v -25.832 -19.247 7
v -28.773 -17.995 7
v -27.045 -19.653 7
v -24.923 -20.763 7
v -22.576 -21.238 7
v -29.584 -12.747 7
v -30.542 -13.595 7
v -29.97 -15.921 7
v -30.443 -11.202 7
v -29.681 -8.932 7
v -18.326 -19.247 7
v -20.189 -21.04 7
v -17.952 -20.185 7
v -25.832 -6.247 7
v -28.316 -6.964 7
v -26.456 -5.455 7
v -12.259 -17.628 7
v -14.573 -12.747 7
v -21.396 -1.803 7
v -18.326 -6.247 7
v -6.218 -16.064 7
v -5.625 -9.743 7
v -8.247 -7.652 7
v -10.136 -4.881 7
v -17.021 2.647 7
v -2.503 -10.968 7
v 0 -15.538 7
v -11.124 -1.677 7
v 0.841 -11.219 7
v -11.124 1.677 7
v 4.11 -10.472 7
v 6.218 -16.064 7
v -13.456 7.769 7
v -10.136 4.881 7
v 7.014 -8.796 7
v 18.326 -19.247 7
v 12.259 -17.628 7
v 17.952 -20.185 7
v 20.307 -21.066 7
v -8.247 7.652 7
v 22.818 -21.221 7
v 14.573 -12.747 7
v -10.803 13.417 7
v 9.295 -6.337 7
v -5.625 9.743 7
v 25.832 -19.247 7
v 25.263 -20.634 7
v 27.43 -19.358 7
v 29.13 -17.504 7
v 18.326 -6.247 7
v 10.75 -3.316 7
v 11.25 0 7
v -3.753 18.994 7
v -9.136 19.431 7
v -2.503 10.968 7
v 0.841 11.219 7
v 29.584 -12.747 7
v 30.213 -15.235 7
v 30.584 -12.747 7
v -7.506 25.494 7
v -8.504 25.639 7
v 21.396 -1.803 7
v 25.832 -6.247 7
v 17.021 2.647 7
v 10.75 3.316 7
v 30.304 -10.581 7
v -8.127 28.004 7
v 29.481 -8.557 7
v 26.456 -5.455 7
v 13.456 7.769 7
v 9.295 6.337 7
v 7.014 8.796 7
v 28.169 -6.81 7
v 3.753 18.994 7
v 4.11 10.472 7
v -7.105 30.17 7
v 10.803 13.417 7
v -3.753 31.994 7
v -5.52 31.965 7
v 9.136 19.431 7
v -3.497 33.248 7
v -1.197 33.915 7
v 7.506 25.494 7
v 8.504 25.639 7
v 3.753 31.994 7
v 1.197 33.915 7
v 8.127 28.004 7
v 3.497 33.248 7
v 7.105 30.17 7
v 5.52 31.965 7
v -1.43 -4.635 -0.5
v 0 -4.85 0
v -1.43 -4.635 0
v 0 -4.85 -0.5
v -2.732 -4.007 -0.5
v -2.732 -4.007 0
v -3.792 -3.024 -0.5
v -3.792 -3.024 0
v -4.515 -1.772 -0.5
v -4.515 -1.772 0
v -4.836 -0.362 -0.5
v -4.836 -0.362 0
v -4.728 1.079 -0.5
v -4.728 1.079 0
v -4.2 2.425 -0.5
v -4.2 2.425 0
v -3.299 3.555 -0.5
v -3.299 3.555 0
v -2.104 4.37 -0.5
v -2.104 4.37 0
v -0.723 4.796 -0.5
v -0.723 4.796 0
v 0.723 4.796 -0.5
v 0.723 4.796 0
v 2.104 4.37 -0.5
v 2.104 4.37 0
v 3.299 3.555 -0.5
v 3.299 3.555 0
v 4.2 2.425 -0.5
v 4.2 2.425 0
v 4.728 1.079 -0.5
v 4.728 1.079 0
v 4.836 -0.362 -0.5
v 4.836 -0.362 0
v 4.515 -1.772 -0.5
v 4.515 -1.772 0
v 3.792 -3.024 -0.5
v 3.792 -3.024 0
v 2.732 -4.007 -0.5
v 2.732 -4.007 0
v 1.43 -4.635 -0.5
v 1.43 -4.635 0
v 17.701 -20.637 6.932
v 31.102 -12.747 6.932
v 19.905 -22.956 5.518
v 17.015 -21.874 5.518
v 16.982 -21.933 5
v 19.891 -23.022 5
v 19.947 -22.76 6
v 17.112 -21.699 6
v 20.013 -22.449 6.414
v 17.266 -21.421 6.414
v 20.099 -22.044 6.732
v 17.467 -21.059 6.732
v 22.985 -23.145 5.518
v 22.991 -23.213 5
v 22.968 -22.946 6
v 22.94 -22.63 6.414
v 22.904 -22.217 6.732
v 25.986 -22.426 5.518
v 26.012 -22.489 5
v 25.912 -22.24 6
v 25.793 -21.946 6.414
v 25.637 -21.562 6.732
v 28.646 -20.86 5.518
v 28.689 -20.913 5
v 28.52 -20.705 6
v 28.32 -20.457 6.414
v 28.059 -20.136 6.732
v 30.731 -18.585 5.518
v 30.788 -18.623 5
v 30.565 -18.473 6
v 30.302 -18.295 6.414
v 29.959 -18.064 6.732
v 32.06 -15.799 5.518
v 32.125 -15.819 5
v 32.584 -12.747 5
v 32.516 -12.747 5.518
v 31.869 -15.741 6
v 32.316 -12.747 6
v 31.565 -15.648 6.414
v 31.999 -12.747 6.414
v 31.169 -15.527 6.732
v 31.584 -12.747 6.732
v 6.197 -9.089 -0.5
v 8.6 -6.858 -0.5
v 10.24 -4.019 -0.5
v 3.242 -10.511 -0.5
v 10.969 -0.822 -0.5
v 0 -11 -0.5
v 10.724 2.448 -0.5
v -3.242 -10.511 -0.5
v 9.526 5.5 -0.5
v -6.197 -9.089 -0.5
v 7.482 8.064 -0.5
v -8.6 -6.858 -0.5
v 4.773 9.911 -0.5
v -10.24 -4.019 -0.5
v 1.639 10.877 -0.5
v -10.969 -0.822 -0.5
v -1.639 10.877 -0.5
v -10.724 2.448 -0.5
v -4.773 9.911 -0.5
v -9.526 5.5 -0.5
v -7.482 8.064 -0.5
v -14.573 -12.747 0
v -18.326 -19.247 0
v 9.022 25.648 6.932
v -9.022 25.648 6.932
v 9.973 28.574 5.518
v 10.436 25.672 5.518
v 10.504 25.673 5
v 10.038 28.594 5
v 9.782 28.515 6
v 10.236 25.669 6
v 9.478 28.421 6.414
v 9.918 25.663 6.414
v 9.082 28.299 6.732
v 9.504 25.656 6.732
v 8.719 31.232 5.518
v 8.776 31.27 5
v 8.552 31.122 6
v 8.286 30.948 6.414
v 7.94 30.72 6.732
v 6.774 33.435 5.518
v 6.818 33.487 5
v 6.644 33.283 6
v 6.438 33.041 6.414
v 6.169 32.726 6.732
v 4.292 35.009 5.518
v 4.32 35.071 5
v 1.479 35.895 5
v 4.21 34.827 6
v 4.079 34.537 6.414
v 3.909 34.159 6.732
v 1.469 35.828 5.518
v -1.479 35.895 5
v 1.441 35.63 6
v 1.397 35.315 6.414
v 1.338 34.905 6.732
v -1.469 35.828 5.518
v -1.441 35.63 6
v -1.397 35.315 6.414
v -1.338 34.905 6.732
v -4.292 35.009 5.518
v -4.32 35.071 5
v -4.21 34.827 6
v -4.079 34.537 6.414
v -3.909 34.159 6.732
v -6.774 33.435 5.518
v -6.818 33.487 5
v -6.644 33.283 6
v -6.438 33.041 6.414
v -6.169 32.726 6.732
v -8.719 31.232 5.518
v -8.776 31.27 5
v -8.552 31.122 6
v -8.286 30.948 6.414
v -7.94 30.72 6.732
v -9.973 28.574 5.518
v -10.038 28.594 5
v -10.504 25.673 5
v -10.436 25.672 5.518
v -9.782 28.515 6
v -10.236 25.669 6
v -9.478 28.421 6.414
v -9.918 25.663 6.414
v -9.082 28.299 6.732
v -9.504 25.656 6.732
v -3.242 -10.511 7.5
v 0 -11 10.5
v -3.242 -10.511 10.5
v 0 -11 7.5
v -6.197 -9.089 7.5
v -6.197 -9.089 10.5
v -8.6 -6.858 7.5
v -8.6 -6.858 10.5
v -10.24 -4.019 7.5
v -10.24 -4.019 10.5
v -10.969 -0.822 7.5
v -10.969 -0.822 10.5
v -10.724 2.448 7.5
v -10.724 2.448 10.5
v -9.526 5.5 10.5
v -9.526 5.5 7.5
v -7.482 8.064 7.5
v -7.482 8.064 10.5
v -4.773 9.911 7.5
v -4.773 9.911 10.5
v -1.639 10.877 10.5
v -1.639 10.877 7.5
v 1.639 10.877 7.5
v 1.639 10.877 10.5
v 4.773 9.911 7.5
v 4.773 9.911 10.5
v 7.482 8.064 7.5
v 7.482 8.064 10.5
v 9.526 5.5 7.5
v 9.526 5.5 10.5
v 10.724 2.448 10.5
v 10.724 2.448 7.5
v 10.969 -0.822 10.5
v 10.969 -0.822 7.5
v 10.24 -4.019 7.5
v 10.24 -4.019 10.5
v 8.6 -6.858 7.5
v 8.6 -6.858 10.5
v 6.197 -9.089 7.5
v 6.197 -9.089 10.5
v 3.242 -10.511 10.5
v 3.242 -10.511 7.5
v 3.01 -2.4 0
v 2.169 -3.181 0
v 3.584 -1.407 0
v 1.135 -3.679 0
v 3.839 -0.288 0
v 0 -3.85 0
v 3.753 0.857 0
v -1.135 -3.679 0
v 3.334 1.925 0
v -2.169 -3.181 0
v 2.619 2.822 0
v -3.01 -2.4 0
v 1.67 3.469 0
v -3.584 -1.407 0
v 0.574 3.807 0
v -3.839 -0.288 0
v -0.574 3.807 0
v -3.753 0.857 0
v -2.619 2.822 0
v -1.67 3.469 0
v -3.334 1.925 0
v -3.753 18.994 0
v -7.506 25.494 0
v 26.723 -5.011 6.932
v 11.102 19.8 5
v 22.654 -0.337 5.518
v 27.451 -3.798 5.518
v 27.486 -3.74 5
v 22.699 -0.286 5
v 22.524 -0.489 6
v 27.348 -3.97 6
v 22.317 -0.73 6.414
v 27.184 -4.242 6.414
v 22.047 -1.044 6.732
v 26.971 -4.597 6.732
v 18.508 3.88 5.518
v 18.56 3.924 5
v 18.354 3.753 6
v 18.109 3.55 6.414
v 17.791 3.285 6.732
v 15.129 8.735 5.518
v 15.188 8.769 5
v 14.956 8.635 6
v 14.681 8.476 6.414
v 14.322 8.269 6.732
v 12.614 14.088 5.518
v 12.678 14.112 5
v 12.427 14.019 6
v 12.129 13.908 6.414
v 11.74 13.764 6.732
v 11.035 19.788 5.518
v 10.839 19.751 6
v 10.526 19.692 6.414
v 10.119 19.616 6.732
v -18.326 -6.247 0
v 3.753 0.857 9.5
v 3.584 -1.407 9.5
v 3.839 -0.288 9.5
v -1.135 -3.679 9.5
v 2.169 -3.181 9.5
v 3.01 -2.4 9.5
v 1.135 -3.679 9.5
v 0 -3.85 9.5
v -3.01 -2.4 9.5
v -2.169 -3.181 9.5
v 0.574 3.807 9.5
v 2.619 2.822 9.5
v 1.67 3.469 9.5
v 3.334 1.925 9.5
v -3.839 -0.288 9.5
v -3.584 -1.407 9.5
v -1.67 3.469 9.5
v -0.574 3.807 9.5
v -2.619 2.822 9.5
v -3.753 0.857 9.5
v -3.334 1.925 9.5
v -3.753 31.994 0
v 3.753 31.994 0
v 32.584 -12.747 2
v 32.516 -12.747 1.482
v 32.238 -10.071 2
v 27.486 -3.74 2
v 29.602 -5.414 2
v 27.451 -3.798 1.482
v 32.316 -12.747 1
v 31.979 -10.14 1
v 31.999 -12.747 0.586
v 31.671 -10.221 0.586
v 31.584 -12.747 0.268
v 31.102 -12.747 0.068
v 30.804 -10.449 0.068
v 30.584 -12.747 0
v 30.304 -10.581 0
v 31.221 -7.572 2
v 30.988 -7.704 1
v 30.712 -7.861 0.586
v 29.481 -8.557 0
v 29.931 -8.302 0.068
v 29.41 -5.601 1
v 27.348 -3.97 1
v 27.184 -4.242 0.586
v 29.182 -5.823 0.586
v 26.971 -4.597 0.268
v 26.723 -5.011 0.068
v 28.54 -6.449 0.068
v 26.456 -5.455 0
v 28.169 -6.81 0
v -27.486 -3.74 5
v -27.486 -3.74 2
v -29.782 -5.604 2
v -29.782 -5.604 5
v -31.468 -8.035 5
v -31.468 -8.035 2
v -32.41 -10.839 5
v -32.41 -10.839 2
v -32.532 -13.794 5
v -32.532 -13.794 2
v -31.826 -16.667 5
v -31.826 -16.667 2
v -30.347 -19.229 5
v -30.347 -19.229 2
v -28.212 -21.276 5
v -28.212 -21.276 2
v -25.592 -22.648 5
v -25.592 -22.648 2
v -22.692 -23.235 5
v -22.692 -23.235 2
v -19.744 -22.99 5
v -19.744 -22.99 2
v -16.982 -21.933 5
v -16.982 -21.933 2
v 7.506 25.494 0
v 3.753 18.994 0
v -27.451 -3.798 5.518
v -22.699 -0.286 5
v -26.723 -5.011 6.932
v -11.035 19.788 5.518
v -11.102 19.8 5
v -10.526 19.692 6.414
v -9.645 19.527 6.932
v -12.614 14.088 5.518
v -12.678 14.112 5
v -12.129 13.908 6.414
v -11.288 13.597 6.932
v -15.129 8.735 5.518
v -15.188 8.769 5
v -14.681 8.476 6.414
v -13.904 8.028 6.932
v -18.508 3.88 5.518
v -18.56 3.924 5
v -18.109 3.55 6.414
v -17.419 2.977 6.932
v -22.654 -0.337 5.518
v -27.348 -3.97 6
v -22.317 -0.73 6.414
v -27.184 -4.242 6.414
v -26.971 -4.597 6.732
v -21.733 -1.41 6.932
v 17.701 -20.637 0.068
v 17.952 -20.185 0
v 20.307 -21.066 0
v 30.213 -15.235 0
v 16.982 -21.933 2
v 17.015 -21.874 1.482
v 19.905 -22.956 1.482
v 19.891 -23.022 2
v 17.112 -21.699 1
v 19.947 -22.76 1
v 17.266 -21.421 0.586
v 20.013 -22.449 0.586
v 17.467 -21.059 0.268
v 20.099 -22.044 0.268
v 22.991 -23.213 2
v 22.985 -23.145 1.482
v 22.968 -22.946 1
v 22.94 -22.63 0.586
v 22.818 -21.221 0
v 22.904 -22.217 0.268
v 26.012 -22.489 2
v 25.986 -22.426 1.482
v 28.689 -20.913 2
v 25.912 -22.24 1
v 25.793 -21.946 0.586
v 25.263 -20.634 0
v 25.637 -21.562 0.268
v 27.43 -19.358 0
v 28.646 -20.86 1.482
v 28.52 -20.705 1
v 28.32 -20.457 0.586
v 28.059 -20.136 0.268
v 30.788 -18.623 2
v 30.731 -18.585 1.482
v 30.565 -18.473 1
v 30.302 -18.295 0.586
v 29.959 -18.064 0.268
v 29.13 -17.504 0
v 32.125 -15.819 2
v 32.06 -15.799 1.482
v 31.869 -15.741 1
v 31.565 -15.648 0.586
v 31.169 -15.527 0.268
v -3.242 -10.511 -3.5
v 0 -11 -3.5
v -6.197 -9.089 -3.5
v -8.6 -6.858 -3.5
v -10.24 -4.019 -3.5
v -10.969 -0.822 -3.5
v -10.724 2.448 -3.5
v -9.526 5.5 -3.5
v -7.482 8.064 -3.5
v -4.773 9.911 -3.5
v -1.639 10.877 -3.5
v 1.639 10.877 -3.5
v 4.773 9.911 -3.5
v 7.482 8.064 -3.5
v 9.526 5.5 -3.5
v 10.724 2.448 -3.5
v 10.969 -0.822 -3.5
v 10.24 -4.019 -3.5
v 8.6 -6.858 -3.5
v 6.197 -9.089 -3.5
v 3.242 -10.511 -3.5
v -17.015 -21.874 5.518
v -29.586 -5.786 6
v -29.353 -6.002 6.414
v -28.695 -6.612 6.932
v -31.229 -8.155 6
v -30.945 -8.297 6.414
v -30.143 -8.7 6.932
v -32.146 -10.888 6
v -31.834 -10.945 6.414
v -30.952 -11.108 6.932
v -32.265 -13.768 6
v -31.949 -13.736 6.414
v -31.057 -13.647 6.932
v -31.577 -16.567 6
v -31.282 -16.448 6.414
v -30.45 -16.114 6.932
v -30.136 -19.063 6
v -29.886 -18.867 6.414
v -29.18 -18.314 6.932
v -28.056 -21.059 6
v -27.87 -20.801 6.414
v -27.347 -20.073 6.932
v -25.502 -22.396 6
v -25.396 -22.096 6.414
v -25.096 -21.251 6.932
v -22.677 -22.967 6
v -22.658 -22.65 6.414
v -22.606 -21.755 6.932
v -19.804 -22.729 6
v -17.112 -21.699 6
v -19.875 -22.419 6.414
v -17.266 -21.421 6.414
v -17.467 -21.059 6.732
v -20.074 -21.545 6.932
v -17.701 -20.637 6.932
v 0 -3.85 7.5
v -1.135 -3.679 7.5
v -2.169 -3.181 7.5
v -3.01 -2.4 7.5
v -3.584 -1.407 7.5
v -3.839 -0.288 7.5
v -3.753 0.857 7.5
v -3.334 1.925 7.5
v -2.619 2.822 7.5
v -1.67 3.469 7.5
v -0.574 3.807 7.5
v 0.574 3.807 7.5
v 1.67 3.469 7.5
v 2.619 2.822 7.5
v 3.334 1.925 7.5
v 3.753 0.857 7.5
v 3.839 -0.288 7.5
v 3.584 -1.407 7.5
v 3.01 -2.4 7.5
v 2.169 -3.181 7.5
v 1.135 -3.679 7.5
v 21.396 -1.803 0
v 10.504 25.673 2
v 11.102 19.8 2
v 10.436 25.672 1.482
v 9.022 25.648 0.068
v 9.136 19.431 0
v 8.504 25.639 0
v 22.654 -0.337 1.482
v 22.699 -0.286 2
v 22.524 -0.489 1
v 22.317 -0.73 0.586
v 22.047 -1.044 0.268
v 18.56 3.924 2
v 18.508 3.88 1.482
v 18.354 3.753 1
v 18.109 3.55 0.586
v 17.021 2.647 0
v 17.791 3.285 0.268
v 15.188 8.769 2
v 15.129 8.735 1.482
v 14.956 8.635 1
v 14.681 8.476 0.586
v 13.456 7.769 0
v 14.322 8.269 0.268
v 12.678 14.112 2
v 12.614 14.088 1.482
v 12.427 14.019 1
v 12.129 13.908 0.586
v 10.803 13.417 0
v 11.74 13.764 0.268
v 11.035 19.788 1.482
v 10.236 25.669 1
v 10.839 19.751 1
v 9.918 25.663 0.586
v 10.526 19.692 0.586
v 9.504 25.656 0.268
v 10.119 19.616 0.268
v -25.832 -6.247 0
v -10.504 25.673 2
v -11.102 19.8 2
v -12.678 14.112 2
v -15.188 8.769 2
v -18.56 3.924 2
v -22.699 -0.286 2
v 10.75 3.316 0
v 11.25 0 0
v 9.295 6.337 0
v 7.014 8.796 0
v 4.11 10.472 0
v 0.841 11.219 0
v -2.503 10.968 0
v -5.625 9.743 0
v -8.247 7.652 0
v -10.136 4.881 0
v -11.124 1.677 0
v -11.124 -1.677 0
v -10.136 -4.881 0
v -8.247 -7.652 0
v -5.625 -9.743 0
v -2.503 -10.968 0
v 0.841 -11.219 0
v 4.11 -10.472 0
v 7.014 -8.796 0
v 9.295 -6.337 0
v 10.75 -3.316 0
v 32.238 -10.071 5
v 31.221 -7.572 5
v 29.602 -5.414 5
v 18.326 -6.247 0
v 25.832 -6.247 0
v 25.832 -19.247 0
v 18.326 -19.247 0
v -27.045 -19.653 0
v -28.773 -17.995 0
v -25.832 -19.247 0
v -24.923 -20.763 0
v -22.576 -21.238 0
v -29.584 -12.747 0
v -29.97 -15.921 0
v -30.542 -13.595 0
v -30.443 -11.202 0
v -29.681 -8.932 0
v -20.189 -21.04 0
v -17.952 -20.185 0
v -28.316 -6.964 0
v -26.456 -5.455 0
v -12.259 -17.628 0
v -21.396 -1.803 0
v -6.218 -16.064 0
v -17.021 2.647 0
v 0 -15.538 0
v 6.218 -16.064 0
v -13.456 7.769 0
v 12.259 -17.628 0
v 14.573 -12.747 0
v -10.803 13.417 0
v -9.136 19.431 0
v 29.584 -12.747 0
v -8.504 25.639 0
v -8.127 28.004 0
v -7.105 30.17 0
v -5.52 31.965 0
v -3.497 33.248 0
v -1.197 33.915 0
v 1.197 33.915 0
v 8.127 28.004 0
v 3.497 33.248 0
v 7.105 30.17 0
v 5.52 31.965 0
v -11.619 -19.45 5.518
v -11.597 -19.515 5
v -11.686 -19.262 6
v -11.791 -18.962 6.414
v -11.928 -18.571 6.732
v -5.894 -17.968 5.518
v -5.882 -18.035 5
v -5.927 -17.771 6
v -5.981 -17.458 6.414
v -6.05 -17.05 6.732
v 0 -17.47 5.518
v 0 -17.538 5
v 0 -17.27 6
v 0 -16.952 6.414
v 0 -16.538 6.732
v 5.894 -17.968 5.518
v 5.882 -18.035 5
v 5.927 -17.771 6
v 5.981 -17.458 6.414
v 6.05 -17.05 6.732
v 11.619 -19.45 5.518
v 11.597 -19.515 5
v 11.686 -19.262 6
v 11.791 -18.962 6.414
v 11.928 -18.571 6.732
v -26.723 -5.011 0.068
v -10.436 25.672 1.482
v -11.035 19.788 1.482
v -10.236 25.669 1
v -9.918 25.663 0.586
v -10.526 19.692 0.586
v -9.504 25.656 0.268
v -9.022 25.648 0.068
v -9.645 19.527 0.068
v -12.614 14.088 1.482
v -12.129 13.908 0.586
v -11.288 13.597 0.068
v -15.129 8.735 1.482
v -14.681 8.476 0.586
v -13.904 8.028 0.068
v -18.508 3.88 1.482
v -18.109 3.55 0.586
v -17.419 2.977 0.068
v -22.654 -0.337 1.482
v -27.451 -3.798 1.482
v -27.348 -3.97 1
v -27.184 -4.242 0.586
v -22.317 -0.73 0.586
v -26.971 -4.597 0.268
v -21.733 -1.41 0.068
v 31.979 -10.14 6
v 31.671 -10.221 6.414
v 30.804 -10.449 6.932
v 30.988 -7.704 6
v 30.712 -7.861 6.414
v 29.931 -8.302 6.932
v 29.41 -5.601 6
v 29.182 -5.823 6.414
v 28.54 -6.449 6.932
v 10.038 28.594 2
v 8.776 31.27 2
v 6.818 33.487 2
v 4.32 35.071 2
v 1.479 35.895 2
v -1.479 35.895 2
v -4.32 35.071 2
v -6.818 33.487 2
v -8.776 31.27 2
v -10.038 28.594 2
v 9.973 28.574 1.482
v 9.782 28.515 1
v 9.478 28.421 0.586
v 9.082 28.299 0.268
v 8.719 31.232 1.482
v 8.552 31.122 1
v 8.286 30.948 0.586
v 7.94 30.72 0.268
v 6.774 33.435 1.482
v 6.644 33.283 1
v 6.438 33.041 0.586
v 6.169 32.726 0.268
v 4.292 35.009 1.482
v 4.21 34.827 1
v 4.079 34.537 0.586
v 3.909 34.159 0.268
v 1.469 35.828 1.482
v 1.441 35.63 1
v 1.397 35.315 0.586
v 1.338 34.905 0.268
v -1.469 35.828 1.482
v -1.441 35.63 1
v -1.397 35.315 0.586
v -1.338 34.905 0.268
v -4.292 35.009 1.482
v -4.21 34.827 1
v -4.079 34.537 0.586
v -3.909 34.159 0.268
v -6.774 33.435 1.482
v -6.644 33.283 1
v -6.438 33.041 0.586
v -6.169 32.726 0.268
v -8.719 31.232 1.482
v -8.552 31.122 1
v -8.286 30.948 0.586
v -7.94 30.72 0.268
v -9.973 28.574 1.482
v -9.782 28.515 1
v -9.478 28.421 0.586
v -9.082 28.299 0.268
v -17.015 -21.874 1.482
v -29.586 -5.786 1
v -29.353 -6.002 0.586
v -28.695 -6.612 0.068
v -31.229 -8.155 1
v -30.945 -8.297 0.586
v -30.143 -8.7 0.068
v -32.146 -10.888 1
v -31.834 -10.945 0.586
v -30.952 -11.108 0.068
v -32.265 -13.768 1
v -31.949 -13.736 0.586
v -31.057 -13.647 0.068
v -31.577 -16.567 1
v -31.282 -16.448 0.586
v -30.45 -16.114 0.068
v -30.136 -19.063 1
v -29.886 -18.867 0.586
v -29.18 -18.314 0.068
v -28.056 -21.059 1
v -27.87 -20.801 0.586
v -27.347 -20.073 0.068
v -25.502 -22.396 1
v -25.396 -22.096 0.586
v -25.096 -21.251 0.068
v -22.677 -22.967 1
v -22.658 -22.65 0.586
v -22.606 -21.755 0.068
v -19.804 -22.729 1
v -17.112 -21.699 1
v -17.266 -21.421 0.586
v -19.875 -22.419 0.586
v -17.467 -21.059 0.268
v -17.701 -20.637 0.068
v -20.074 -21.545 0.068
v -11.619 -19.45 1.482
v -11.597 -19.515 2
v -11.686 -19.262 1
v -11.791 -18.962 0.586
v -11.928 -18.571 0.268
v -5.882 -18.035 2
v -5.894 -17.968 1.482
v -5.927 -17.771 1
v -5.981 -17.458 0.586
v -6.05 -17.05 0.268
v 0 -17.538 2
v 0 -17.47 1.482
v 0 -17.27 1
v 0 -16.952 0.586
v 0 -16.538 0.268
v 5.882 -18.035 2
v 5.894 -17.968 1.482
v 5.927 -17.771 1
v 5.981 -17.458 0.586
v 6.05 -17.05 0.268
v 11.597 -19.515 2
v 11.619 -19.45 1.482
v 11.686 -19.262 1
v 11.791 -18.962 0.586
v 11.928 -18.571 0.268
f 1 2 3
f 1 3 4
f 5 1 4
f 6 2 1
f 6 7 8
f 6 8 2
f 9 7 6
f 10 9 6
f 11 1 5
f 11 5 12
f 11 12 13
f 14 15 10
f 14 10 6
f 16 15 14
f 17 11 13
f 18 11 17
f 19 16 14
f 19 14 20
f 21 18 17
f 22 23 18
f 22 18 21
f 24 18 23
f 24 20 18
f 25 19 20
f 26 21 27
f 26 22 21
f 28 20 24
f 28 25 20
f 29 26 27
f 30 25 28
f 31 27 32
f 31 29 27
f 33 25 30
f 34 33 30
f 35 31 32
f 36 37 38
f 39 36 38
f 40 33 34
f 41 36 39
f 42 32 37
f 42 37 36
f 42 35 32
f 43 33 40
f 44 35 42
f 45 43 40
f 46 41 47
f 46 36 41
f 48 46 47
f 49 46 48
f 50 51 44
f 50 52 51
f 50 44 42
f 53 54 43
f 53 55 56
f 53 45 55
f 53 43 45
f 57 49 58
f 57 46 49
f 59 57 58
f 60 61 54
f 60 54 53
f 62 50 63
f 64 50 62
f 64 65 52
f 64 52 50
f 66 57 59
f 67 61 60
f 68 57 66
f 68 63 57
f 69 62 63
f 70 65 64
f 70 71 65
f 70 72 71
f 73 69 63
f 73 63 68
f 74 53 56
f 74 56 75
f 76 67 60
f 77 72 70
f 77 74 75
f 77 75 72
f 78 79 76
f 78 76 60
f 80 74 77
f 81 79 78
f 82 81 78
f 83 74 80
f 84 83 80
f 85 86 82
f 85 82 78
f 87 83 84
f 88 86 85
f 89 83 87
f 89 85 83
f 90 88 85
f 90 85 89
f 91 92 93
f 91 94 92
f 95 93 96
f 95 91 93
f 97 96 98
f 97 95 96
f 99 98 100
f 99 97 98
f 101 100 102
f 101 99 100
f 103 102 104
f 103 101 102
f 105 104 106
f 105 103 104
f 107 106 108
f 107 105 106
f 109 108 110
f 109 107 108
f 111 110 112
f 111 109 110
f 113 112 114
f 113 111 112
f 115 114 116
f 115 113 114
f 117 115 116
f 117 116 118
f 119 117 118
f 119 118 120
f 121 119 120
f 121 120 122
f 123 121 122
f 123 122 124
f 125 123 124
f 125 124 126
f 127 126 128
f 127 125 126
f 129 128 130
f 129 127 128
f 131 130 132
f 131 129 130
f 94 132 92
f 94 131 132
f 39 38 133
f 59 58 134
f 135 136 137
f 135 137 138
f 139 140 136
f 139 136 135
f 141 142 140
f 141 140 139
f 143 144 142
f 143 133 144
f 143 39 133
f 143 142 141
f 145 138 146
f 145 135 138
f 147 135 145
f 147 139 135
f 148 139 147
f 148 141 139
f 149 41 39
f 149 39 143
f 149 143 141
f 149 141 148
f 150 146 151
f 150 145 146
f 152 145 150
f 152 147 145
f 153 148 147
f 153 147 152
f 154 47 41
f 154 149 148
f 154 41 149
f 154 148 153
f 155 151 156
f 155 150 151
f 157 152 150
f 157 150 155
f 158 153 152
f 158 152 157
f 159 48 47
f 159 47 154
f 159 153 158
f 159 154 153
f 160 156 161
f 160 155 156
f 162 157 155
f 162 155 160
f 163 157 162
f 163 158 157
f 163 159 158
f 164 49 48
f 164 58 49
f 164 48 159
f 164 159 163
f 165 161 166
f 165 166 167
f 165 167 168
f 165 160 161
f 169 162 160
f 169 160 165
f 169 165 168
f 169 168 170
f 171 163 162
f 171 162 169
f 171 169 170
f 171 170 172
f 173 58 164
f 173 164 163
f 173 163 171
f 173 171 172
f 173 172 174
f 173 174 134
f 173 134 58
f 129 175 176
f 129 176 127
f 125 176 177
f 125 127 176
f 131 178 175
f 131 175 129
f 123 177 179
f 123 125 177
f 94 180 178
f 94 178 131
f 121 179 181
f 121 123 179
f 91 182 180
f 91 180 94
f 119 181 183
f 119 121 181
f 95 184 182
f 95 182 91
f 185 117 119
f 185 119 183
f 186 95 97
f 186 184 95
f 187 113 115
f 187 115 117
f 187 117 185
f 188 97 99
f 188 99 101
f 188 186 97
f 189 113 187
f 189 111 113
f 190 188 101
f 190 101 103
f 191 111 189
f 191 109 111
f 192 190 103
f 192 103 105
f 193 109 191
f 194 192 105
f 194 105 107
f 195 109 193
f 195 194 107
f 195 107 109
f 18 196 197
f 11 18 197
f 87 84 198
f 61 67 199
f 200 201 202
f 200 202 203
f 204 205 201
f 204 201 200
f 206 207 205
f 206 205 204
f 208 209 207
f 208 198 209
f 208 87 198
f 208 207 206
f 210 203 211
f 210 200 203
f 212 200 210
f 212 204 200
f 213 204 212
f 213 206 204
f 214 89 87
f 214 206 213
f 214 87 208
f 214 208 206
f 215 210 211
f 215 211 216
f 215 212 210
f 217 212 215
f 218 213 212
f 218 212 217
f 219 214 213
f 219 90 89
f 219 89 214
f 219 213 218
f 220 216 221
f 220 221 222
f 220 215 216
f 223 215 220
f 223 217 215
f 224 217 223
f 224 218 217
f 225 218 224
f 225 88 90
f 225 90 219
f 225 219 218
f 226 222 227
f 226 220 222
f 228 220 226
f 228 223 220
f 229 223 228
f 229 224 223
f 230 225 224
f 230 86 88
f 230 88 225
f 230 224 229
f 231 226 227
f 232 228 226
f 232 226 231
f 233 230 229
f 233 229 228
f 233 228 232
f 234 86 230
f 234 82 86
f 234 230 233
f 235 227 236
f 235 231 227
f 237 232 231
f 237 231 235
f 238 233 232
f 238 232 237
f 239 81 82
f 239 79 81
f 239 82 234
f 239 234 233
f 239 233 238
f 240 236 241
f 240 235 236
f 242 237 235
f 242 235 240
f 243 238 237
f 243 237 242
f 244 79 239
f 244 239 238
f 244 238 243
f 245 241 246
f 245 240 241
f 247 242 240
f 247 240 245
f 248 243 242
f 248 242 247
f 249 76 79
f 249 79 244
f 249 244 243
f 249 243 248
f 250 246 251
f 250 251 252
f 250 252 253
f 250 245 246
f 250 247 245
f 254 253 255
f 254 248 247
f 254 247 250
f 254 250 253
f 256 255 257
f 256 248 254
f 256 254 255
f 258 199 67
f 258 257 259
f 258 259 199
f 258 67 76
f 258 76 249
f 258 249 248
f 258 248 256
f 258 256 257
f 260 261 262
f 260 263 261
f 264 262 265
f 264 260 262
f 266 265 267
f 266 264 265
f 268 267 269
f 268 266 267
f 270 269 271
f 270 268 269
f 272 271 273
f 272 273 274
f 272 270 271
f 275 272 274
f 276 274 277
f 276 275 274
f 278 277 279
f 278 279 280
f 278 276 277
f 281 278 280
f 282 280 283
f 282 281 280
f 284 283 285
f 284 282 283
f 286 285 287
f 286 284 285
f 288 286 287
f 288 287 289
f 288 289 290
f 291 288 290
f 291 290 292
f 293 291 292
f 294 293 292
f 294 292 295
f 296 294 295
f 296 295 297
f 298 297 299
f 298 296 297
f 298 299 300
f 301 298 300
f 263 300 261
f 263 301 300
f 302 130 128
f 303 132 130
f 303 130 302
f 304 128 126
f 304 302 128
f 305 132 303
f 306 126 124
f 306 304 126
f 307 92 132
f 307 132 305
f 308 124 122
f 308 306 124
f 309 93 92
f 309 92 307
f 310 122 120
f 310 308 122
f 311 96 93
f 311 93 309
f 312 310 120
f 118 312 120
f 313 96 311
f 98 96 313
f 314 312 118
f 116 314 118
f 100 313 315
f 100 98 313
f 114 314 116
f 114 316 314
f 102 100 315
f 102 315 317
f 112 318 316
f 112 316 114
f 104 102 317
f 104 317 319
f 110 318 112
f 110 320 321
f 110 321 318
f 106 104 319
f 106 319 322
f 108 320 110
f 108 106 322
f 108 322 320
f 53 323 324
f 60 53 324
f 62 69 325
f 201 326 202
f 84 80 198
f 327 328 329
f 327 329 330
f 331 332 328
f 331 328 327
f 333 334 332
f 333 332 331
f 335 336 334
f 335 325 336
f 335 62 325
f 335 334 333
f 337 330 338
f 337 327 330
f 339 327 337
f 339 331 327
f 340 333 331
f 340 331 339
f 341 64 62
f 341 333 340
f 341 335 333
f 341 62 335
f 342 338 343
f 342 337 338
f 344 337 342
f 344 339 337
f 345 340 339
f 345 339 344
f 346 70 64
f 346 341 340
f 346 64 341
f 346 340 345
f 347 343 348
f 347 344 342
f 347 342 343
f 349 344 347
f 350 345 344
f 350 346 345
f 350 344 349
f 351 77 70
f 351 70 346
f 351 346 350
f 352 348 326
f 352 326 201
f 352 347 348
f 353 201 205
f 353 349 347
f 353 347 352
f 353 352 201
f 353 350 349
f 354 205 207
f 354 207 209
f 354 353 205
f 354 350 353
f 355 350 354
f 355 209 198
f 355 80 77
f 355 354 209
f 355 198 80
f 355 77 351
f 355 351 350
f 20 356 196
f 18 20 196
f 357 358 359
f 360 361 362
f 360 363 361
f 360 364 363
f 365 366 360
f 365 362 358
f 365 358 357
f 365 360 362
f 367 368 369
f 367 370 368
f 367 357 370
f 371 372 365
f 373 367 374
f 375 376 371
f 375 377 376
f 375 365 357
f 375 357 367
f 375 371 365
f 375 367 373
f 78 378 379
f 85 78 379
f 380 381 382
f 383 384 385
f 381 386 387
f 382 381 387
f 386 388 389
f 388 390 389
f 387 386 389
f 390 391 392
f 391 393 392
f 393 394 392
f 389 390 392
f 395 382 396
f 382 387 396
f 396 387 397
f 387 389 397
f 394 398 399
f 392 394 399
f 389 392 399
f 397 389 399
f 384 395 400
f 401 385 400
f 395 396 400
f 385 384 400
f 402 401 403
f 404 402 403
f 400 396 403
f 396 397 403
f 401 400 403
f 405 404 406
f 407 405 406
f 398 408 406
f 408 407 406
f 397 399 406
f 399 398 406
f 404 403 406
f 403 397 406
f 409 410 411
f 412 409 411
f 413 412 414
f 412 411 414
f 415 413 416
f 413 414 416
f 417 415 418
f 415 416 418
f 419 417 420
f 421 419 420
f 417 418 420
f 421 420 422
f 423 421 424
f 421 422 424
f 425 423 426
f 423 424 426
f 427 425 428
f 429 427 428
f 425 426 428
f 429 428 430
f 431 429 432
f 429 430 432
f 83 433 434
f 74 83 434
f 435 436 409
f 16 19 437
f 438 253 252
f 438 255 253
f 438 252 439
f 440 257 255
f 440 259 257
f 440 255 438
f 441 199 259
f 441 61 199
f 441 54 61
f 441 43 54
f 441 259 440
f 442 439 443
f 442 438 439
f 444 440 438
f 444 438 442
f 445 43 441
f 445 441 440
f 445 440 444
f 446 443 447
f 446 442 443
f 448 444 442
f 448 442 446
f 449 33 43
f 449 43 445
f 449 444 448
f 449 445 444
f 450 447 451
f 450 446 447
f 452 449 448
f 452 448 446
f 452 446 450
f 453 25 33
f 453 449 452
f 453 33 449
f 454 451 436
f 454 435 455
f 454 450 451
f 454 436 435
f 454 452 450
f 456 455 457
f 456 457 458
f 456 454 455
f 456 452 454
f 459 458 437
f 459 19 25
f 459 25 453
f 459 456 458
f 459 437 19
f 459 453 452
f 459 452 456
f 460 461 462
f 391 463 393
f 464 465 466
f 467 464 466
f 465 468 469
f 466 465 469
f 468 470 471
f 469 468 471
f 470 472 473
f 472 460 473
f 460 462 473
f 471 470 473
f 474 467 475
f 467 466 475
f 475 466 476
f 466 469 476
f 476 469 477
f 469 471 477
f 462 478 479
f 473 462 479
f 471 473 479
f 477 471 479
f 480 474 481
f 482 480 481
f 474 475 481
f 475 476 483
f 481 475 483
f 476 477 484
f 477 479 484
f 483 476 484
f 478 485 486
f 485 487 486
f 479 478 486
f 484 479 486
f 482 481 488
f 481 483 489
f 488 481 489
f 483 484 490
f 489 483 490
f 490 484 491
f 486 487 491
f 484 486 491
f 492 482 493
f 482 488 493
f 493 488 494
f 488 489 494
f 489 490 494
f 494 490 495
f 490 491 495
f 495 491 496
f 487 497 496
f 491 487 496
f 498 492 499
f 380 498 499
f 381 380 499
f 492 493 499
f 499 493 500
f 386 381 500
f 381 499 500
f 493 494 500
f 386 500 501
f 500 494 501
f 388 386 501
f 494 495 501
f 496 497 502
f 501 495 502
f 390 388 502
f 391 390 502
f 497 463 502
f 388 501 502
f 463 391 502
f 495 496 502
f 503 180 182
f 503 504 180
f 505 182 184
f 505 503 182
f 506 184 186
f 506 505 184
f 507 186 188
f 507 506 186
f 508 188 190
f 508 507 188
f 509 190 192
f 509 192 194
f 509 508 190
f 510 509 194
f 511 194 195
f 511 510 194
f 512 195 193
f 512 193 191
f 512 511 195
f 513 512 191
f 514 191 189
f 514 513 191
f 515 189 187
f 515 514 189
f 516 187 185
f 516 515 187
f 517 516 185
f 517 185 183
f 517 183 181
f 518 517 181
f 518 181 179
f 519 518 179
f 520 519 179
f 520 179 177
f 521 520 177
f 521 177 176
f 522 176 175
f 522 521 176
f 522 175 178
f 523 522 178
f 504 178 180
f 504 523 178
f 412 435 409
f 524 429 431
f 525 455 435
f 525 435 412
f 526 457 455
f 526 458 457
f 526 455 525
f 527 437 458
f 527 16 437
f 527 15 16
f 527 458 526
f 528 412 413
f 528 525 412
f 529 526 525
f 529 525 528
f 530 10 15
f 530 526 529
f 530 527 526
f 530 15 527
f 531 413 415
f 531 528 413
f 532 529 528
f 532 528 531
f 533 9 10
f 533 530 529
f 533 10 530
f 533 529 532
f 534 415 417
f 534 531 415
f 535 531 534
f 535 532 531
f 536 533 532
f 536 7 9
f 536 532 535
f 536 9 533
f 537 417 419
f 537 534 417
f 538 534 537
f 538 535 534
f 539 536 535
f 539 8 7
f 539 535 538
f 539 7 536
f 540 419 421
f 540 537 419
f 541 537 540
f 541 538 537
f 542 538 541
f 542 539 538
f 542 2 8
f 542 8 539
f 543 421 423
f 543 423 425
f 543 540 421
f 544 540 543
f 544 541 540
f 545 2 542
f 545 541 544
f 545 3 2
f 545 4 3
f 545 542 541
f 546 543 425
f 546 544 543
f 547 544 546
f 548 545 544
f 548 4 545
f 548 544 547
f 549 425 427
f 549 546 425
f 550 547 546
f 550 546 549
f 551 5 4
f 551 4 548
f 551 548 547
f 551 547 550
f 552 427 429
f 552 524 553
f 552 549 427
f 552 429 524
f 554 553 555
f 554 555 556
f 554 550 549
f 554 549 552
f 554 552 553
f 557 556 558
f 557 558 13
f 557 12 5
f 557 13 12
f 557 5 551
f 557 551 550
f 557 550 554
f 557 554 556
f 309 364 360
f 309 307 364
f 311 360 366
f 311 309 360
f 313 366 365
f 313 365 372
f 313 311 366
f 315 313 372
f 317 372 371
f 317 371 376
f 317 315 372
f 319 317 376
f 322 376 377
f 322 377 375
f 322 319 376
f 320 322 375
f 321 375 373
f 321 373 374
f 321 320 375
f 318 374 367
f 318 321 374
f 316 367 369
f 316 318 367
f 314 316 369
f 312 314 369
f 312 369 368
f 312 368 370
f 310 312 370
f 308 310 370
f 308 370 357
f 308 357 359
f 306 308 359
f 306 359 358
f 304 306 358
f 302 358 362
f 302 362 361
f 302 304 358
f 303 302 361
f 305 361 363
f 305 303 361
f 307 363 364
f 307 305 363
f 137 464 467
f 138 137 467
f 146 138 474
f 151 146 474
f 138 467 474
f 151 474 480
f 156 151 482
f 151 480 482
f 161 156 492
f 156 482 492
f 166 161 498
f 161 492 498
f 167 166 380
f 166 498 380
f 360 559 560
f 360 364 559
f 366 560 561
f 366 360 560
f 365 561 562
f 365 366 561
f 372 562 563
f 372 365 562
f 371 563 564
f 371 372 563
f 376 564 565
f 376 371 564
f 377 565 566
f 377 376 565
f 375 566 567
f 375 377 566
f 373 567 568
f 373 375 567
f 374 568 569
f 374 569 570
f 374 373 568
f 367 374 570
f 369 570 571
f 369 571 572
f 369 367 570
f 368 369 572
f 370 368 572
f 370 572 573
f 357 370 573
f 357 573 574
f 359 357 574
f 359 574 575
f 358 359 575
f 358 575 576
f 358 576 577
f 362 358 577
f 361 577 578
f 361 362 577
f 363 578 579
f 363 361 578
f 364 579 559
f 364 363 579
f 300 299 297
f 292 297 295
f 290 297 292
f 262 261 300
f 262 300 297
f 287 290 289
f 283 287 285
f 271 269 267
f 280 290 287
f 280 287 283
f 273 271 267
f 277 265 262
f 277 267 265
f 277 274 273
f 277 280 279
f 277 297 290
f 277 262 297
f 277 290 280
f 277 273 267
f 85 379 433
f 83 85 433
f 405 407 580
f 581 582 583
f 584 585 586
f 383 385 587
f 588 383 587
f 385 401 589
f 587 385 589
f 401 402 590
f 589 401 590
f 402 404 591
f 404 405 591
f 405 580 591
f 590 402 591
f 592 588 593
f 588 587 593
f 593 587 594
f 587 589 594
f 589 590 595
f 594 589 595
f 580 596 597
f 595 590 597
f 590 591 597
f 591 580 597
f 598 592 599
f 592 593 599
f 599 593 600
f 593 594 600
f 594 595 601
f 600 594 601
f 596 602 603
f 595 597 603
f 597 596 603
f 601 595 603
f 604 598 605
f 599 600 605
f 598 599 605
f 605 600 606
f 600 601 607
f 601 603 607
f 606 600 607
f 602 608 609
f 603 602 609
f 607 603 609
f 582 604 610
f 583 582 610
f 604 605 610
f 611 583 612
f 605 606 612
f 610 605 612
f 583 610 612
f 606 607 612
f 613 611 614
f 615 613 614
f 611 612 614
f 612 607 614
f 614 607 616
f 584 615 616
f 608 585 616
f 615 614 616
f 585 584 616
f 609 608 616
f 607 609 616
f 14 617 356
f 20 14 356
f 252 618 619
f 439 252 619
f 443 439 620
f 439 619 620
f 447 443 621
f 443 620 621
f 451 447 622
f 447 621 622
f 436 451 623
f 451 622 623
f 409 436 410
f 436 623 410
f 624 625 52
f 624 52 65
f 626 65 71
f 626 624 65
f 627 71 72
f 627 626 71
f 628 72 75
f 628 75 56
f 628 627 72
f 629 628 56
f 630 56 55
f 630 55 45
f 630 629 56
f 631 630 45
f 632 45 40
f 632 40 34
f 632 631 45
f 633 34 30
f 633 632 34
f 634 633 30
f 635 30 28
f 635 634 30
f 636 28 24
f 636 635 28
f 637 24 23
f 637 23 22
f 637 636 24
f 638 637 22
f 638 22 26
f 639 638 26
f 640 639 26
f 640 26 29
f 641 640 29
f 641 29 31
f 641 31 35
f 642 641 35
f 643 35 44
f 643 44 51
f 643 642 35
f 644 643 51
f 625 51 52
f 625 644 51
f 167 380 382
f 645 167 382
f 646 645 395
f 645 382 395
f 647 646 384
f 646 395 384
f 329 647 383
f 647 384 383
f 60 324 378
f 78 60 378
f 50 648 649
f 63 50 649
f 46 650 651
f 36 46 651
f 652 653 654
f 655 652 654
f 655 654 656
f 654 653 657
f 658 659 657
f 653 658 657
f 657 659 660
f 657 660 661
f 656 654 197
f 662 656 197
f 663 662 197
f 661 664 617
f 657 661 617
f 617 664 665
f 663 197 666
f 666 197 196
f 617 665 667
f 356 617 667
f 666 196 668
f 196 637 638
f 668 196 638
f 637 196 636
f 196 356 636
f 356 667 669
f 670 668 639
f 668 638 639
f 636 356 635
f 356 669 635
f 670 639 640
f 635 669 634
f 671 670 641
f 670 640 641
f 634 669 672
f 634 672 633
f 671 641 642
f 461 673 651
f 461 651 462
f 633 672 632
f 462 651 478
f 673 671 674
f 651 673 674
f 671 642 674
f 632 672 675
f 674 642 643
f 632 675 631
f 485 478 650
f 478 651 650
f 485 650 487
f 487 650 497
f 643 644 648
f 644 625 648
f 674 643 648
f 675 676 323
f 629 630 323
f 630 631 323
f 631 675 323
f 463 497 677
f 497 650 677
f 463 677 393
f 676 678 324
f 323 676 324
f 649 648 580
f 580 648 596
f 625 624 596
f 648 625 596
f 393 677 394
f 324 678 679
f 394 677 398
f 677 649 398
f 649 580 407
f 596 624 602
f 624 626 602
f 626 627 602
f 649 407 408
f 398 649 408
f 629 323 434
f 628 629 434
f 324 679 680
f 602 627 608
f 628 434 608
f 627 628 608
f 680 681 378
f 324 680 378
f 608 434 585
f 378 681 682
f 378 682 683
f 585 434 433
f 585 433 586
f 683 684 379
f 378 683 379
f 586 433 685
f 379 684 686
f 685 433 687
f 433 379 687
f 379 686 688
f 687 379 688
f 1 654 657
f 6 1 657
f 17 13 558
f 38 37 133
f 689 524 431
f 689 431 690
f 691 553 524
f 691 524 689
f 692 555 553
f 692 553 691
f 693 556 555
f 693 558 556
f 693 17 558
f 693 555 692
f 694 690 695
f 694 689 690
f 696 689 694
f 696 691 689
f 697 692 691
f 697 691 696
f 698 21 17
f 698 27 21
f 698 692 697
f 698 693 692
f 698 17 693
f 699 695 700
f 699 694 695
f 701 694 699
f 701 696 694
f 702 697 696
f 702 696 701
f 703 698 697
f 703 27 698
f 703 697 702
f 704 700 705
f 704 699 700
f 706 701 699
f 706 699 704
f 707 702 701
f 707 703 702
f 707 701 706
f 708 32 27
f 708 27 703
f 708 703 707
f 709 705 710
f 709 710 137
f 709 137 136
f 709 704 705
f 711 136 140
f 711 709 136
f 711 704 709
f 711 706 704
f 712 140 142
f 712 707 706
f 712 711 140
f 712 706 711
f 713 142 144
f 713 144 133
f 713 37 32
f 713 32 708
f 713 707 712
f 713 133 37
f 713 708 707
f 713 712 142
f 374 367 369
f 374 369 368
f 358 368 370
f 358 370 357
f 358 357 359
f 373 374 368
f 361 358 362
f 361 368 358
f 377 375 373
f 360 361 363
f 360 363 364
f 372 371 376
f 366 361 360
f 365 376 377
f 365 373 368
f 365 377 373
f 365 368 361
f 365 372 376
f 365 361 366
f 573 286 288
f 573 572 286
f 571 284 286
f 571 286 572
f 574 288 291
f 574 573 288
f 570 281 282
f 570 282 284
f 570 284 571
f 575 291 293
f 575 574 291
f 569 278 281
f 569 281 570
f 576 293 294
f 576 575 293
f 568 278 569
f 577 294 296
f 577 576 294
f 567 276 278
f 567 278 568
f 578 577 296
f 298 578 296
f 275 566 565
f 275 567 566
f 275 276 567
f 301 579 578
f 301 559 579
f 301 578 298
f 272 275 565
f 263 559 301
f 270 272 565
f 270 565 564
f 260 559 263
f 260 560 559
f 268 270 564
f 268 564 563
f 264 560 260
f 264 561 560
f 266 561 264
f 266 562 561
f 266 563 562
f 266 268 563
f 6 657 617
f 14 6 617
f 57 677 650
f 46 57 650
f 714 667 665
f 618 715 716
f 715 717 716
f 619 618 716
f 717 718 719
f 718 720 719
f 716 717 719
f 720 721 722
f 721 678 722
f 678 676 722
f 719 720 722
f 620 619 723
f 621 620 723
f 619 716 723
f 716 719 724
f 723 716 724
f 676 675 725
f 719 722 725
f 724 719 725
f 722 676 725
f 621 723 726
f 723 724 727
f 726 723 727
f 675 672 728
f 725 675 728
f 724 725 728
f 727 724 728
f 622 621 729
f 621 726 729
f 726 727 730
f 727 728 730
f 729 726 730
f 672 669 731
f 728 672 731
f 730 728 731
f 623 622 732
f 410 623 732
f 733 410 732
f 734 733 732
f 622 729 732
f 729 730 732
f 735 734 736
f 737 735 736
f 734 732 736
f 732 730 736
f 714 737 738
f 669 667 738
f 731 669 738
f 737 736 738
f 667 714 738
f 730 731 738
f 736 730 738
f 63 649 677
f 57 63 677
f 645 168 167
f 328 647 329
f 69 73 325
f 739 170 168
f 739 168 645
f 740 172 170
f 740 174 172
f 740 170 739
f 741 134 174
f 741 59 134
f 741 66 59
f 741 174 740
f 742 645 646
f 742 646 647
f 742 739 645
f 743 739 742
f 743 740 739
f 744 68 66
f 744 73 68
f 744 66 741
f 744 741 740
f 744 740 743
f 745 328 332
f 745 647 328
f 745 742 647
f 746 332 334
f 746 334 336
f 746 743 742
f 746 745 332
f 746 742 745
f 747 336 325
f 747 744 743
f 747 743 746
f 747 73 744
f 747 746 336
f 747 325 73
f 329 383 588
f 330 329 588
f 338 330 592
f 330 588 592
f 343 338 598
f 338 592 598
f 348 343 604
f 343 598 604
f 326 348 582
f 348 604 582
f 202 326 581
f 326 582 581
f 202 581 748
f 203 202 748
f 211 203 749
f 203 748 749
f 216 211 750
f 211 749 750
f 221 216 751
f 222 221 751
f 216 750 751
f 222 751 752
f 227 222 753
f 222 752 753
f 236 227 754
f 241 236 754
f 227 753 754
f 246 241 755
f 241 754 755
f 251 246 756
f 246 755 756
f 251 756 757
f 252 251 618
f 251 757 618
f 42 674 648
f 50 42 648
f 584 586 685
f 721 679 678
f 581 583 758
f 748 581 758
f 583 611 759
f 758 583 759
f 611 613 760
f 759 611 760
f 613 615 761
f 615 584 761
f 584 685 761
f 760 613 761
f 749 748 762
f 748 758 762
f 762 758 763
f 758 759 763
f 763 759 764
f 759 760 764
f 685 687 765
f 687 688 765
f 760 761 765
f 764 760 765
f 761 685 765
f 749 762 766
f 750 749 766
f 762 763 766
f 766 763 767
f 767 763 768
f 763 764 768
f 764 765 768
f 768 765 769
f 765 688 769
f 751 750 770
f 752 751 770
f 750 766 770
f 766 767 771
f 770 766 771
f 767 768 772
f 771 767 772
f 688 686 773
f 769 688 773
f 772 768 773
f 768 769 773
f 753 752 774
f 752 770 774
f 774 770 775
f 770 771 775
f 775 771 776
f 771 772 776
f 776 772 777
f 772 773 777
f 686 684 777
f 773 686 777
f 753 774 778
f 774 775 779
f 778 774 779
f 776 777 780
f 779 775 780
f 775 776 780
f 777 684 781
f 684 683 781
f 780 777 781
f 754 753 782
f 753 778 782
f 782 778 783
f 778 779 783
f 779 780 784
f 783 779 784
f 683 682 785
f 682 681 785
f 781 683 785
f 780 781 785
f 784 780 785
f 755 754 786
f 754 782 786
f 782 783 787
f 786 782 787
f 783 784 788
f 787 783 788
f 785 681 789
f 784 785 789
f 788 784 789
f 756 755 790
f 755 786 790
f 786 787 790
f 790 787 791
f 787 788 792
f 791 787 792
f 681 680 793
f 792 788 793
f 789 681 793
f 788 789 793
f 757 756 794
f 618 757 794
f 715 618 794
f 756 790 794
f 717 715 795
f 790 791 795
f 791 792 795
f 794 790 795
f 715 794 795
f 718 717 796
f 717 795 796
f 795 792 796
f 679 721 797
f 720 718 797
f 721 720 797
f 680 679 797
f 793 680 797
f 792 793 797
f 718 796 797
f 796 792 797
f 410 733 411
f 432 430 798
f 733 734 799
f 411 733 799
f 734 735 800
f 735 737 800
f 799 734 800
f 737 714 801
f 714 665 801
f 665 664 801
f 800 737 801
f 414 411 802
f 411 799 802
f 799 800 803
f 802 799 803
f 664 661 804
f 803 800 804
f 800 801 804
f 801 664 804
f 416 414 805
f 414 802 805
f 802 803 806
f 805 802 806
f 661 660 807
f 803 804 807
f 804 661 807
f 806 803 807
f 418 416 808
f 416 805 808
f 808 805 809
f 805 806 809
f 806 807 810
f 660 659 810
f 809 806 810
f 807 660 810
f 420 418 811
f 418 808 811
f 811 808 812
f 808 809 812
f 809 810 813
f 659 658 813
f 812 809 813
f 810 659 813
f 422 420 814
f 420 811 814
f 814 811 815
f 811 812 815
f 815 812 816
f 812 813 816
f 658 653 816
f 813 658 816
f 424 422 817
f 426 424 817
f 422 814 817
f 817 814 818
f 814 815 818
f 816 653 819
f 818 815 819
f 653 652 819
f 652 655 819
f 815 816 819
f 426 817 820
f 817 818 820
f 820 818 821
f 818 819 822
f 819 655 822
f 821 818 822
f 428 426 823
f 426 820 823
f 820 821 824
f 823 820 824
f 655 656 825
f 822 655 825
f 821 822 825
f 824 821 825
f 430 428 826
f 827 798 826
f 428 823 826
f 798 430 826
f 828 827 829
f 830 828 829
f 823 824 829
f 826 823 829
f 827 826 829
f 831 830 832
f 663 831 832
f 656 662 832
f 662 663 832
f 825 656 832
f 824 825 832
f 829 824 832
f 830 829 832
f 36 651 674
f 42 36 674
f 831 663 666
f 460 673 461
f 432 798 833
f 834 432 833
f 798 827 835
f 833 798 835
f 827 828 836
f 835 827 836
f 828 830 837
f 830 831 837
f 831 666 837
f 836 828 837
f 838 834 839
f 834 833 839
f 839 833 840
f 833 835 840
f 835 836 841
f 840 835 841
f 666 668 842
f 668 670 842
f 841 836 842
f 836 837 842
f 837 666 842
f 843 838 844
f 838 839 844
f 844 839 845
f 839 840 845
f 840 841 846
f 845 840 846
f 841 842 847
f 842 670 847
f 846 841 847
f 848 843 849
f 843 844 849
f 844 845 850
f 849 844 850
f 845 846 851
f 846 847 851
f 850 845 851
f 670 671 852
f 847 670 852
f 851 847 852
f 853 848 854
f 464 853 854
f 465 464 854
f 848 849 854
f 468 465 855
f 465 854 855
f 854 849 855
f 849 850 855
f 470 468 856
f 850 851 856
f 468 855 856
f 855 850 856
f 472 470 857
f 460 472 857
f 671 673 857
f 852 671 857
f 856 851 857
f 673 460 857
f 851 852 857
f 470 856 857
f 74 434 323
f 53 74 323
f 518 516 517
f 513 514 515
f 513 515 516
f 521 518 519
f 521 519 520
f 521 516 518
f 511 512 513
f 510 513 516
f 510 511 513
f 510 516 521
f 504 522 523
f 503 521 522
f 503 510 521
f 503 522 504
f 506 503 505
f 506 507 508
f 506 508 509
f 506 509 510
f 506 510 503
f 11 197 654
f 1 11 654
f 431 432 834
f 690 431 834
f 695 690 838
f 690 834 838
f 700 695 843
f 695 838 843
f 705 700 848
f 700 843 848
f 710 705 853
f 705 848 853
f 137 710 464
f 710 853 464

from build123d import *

# Parameters (mm, degrees)
F0_R     = 11.25
F1_DEPTH = 7
F2_R     = 2


with BuildPart() as f1:
    # F0 (on Top) → F1 (new body)
    with BuildSketch(Plane.XY):
        with BuildLine():
            ThreePointArc((-10.5040322028, 25.6732251716), (-0.0893925718, 14.9892733321), (10.5055534995, 25.4944465005))
            ThreePointArc((10.5055534995, 25.4944465005), (10.5051731684, 25.5838390724), (10.5040322028, 25.6732251716))
            ThreePointArc((10.5040322028, 25.6732251716), (0, 36), (-10.5040322028, 25.6732251716))
        make_face()
        Polygon((3.7527767497, 31.9944465005), (7.5055534995, 25.4944465005), (3.7527767497, 18.9944465005), (-3.7527767497, 18.9944465005), (-7.5055534995, 25.4944465005), (-3.7527767497, 31.9944465005), align=None, mode=Mode.SUBTRACT)
        with BuildLine():
            ThreePointArc((10.5040322028, 25.6732251716), (10.5051731684, 25.5838390724), (10.5055534995, 25.4944465005))
            ThreePointArc((10.5055534995, 25.4944465005), (-0.0893925718, 14.9892733321), (-10.5040322028, 25.6732251716))
            ThreePointArc((-10.5040322028, 25.6732251716), (-15.188074762, 8.7688390523), (-27.4856812971, -3.739853856))
            ThreePointArc((-27.4856812971, -3.739853856), (-16.9036679788, -3.6047801294), (-11.5732848254, -12.7472232503))
            ThreePointArc((-11.5732848254, -12.7472232503), (-13.0257877758, -18.0772260726), (-16.9816490943, -21.9333713156))
            ThreePointArc((-16.9816490943, -21.9333713156), (0, -17.5376781046), (16.9816490943, -21.9333713156))
            ThreePointArc((16.9816490943, -21.9333713156), (12.9807621135, -7.4944465005), (27.4856812971, -3.739853856))
            ThreePointArc((27.4856812971, -3.739853856), (15.188074762, 8.7688390523), (10.5040322028, 25.6732251716))
        make_face()
        Circle(F0_R, mode=Mode.SUBTRACT)
        with BuildLine():
            ThreePointArc((32.5843918244, -12.7472232503), (31.2212814458, -7.5720529042), (27.4856812971, -3.739853856))
            ThreePointArc((27.4856812971, -3.739853856), (12.9807621135, -7.4944465005), (16.9816490943, -21.9333713156))
            ThreePointArc((16.9816490943, -21.9333713156), (27.4088411472, -21.8002737994), (32.5843918244, -12.7472232503))
        make_face()
        Polygon((25.8316150746, -6.2472232503), (29.5843918244, -12.7472232503), (25.8316150746, -19.2472232503), (18.3260615752, -19.2472232503), (14.5732848254, -12.7472232503), (18.3260615752, -6.2472232503), align=None, mode=Mode.SUBTRACT)
        with BuildLine():
            ThreePointArc((-11.5732848254, -12.7472232503), (-16.9036679788, -3.6047801294), (-27.4856812971, -3.739853856))
            ThreePointArc((-27.4856812971, -3.739853856), (-31.1769145362, -18), (-16.9816490943, -21.9333713156))
            ThreePointArc((-16.9816490943, -21.9333713156), (-13.0257877758, -18.0772260726), (-11.5732848254, -12.7472232503))
        make_face()
        Polygon((-18.3260615752, -19.2472232503), (-25.8316150746, -19.2472232503), (-29.5843918244, -12.7472232503), (-25.8316150746, -6.2472232503), (-18.3260615752, -6.2472232503), (-14.5732848254, -12.7472232503), align=None, mode=Mode.SUBTRACT)
    extrude(amount=F1_DEPTH)

    # F2
    f2_edges = [f1.edges().sort_by_distance(p)[0] for p in [
        (-31.176915, -18, 7),
        (-31.176915, -18, 0),
    ]]
    fillet(f2_edges, radius=F2_R)


with BuildPart() as f4:
    # F3 (on Right) → F4 (revolve)
    with BuildSketch(Plane.YZ):
        Polygon((-3.85, 7.5), (-3.85, 7), (-3.85, 0), (-3.95, 0), (-4.85, 0), (-4.85, -0.5), (-11, -0.5), (-11, -3.5), (0, -3.5), (0, 9.5), (-3.85, 9.5), align=None)
    revolve(axis=Axis((0, 0, 3.6496419925), (0, 0, -1)))


with BuildPart() as f5:
    # F3 (on Right) → F5 (revolve)
    with BuildSketch(Plane.YZ):
        Polygon((-11, 7.5), (-3.85, 7.5), (-3.85, 9.5), (0, 9.5), (0, 10.5), (-11, 10.5), align=None)
    revolve(axis=Axis((0, 0, 3.6496419925), (0, 0, -1)))


solid = Compound([f1.part, f4.part, f5.part])
